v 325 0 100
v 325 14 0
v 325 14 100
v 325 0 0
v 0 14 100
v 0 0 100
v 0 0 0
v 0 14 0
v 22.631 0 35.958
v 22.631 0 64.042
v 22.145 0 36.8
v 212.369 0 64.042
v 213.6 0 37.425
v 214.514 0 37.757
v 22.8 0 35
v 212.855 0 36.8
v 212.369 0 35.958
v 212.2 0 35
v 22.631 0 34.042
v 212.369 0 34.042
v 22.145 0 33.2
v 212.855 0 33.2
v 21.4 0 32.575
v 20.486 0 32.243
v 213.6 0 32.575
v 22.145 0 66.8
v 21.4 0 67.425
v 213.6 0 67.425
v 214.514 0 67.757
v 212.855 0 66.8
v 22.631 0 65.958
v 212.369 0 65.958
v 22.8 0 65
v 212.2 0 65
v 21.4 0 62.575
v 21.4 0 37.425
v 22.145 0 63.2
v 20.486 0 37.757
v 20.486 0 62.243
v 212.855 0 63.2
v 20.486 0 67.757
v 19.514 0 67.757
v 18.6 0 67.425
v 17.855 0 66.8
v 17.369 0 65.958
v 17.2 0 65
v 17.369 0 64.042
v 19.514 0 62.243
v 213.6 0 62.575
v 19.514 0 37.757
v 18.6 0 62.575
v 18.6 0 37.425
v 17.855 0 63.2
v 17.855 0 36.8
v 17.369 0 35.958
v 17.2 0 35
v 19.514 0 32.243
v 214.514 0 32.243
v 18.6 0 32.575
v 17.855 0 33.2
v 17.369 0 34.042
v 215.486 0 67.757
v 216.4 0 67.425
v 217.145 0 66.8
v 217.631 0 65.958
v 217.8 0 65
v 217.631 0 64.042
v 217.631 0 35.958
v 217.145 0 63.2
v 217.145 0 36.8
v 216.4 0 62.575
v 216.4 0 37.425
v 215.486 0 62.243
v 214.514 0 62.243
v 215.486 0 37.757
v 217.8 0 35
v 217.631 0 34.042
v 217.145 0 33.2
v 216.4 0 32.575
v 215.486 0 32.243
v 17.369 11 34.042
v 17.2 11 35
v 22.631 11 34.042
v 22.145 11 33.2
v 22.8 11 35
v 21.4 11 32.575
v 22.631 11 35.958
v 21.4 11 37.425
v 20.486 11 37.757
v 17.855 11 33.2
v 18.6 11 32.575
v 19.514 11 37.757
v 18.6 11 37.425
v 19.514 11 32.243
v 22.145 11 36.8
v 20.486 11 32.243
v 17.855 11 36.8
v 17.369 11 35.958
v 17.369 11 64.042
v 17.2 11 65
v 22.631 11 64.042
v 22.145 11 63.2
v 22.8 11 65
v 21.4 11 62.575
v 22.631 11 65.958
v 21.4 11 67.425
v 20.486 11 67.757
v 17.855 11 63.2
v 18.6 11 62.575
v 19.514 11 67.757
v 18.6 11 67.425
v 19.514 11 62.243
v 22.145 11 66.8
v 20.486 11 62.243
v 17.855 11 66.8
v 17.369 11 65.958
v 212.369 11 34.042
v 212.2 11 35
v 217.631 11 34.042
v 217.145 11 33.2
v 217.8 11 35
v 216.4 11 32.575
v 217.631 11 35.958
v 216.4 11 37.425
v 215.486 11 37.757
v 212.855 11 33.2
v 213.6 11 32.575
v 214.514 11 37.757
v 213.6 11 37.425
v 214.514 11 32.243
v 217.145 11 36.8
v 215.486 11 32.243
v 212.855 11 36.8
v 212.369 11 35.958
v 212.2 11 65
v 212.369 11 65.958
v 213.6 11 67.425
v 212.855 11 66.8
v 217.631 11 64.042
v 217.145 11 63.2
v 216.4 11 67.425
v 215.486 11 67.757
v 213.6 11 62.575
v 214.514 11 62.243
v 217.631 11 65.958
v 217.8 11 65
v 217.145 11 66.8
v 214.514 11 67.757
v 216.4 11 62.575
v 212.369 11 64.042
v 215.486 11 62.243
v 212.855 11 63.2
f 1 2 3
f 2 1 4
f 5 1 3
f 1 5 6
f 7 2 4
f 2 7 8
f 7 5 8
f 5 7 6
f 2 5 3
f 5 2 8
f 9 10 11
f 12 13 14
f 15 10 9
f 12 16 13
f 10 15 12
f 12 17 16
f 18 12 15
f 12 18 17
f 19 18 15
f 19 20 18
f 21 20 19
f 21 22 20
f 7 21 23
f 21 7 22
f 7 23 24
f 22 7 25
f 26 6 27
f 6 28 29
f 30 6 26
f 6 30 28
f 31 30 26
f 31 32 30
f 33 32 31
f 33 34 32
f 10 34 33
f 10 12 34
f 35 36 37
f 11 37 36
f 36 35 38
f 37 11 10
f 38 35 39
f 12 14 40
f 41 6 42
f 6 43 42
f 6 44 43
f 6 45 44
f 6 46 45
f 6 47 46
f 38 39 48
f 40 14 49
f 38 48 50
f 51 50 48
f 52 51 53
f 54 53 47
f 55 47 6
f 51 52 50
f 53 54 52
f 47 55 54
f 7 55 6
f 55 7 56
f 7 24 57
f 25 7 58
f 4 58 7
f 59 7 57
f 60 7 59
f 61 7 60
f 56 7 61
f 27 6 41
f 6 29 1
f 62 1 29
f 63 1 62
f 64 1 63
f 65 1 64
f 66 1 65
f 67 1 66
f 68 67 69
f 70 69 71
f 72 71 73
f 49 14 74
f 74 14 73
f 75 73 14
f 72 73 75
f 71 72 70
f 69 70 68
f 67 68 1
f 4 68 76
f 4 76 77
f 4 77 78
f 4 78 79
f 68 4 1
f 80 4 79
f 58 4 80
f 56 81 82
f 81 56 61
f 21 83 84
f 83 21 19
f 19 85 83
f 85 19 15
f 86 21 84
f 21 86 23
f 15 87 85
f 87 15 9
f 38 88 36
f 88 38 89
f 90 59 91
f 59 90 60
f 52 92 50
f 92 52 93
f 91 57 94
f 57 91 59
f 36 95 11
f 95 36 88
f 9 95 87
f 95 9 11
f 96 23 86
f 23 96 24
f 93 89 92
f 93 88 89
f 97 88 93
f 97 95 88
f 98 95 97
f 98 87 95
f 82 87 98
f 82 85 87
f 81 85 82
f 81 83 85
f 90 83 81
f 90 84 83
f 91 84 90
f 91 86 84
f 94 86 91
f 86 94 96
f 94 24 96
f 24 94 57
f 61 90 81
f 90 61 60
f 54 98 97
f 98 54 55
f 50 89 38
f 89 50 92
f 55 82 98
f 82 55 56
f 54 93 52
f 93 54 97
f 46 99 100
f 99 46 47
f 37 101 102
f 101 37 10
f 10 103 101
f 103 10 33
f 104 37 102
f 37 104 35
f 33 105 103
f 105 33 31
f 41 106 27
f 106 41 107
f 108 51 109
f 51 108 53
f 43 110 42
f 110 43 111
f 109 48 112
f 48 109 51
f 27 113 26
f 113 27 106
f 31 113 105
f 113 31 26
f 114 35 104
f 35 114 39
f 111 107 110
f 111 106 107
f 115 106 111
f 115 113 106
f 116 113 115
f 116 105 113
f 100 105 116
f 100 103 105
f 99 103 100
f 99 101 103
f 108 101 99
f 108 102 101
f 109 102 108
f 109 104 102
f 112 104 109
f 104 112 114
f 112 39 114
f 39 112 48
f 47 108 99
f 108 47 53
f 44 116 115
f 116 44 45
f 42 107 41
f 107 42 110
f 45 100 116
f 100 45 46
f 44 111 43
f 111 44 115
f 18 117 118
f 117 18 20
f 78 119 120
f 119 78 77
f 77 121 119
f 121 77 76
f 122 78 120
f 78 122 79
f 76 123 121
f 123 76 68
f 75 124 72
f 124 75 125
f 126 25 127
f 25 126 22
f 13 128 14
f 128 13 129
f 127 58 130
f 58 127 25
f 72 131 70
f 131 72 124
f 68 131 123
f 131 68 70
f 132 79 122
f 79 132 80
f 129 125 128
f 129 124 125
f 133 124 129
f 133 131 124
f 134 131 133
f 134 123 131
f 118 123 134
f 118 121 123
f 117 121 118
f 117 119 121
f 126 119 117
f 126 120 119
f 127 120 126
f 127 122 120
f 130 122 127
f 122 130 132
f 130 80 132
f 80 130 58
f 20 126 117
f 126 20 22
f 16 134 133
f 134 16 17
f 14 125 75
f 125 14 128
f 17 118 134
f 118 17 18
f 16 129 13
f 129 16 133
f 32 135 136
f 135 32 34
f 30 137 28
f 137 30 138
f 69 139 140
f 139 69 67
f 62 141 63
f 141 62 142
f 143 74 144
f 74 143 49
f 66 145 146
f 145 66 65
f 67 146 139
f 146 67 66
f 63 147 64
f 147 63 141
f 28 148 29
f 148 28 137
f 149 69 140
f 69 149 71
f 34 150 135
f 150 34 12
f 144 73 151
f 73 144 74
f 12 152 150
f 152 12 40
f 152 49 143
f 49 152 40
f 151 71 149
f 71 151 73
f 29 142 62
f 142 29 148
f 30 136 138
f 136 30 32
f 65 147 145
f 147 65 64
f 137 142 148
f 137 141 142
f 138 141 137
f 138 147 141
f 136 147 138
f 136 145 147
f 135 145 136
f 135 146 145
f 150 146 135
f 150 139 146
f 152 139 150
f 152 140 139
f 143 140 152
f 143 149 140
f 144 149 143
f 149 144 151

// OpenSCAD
// file: ../lib/project/mount_ring_module.scad
// rodi-stand/mount_ring_module.scad
// Shared RO/DI mount ring modules.

module wedge() {
  wedge_radius = mount_ring_outer_diameter + 1;
  rotate([0, 0, -90 - mount_opening_angle / 2])
  translate([0, 0, -1])
    linear_extrude(height = mount_ring_height + 2) {
      polygon(points = [
        [0, 0],
        [wedge_radius, 0],
        [cos(mount_opening_angle) * wedge_radius, sin(mount_opening_angle) * wedge_radius]
      ]);
    }
}

module screw_cutout() {
  translate([0, 0, mount_ring_height / 2])
  rotate([-90, 0, 0])
  union() {
    cylinder(mount_ring_inner_diameter / 2 + mount_surface_extension + 1, screw_hole_diameter / 2, screw_hole_diameter / 2);
    cylinder(mount_ring_inner_diameter / 2 + mount_surface_extension - screw_wall_width, screw_access_diameter / 2, screw_access_diameter / 2);
  }
}

module mount_ring() {
  difference() {
    union() {
      translate([-mount_surface_width / 2, 0, 0])
        cube([mount_surface_width, mount_ring_inner_diameter / 2 + mount_surface_extension, mount_ring_height]);
      cylinder(mount_ring_height, mount_ring_outer_diameter / 2, mount_ring_outer_diameter / 2);
    };
    translate([0, 0, -1])
      cylinder(mount_ring_height + 2, mount_ring_inner_diameter / 2, mount_ring_inner_diameter / 2);
    wedge();
    translate([screw_spacing / 2, 0, 0])
      screw_cutout();
    translate([-screw_spacing / 2, 0, 0])
      screw_cutout();
  }
}
// main file
// RO/DI Water Filter Stand
// Designed for 3D printing on a 256x256x256 mm build plate

use <../lib/project/mount_ring_module.scad>;

// ---------- Public parameters (mm) ----------
// Base dimensions (full build plate).
base_width = 250;
base_depth = 250;
base_thickness = 15;
base_front_corner_cut = 25;
base_back_corner_cut = 50;

// Mounting surface dimensions (shared by stand and mount plates).
mount_width = 100; // Width of the mounting surface.
mount_height = 200; // Height of mounting surface (adjustable).
base_glueing_surface_thickness = 6; // Thickness of mounting surface on the base.

// Screw parameters (shared by mount ring and mount plates).
screw_spacing = 30; // Horizontal spacing between screw holes.

// Stand positioning.
stand_offset_from_back = 40; // Distance from back edge of base.
stand_position_x = base_width / 2; // Center of base width-wise.

// Honeycomb pattern parameters.
honeycomb_width = 34;
honeycomb_margin = 40; // Margin from front and side edges of base.
honeycomb_back_margin = 80; // Distance from back edge - keeps back solid for stand mounting.

// Reinforcement gusset dimensions (optional - set to 0 to disable).
gusset_depth = 40; // Forward extension from mounting surface.
gusset_thickness = 6; // Thickness of gussets.
top_surface_angle = 45; // Angle of the top surface in degrees (0 = flat, positive = angled back).

// Mount ring parameters.
mount_ring_outer_diameter = 68;
mount_ring_inner_diameter = 60.5;
mount_ring_height = 20;
mount_surface_width = 65;
mount_surface_extension = 20;
mount_opening_angle = 120;
screw_wall_width = 12;
screw_hole_diameter = 4.5; // Mount ring screw hole diameter.
screw_access_diameter = 10;

// ---------- Resolution ----------
$fa = 1;
$fs = 1;

// ---------- Derived ----------
honeycomb_radius = (honeycomb_width / 2) / cos(30); // Radius of each hexagon (circumradius - distance from center to vertex).

// Calculate stand position.
stand_x = stand_position_x;
stand_y = base_depth - stand_offset_from_back - base_glueing_surface_thickness / 2;

module hexagon(radius) {
    // Create a regular hexagon
    // radius is the distance from center to vertex
    rotate([0, 0, 30])
    linear_extrude(height = base_thickness + 1) {
        circle(radius, $fn = 6);
    }
}

module honeycomb_pattern() {
    // Generate a tight honeycomb pattern where hexagons touch (like infill)
    // Hexagons are offset in alternating rows for true honeycomb pattern
    // For touching hexagons: horizontal spacing = radius * sqrt(3), vertical = radius * 1.5
    hex_apothem = honeycomb_radius * sqrt(3) / 2; // Distance from center to edge
    hex_horizontal_spacing = honeycomb_radius * sqrt(3); // Center-to-center horizontal (same row)
    hex_vertical_spacing = honeycomb_radius * 1.5; // Center-to-center vertical (adjacent rows)
    hex_row_offset = honeycomb_radius * sqrt(3) / 2; // Horizontal offset for alternating rows
    
    // Calculate pattern area (only front portion, not near back where stand mounts)
    pattern_width = base_width - 2 * honeycomb_margin;
    pattern_depth = base_depth - honeycomb_margin - honeycomb_back_margin; // Only front portion
    
    // Calculate how many hexagons fit
    num_cols = floor(pattern_width / hex_horizontal_spacing) + 2; // Extra columns for offset rows
    num_rows = floor(pattern_depth / hex_vertical_spacing) + 1;
    
    // Start position (front and centered)
    start_x = honeycomb_margin;
    start_y = honeycomb_margin;
    
    // Generate hexagons in honeycomb pattern (only in front area)
    for (row = [0 : num_rows - 1]) {
        y_pos = start_y + row * hex_vertical_spacing;
        // Only generate rows that are in the front area
        if (y_pos <= base_depth - honeycomb_back_margin) {
            // Offset every other row for honeycomb pattern
            x_offset = (row % 2 == 0) ? 0 : hex_row_offset;
            for (col = [0 : num_cols - 1]) {
                x_pos = start_x + col * hex_horizontal_spacing + x_offset;
                // Only create hexagon if it's within the horizontal bounds
                if (x_pos >= honeycomb_margin && x_pos <= base_width - honeycomb_margin) {
                    translate([x_pos, y_pos, -0.5])
                        hexagon(honeycomb_radius * 0.8);
                }
            }
        }
    }
}

module base() {
    // Base as a full square with honeycomb pattern cut from the middle
    difference() {
        // Full square base as extruded polygon (ready for rounded corners later)
        linear_extrude(height = base_thickness) {
            polygon(points = [
                [0, base_front_corner_cut], // Front left corner
                [base_front_corner_cut, 0],  // Front left corner
                [base_width - base_front_corner_cut, 0],              // Front right corner
                [base_width, base_front_corner_cut],              // Front right corner
                [base_width, base_depth - base_back_corner_cut],     // Back right corner
                [base_width - base_back_corner_cut, base_depth],     // Back right corner
                [base_back_corner_cut, base_depth],              // Back left corner
                [0, base_depth - base_back_corner_cut]              // Back left corner
            ]);
        }
        
        // Cut honeycomb pattern from the middle
        honeycomb_pattern();
    }
}

module angled_top_cut() {
    // Cut angled top surface using a rotated cube
    // Create cube, rotate around X axis, then translate along Z axis
    translate([0, -base_glueing_surface_thickness / 2, mount_height])
        rotate([-top_surface_angle, 0, 0])
            translate([-mount_width, -gusset_depth, 0])
                cube([mount_width * 2, gusset_depth * 3, gusset_depth * 3]);
}

module mounting_stand() {
    // Create the gluing surface and gussets as cubes at origin
    // Geometry is created with back edge at Y=0, centered at X=0, starting at Z=0
    difference() {
        union() {
            // Mounting surface (flat wall-like surface on base - mount plate glues to this)
            // Positioned so back edge is at Y=0, centered at X=0
            translate([-mount_width / 2, -base_glueing_surface_thickness / 2, 0])
                cube([mount_width, base_glueing_surface_thickness, mount_height]);
            
            // Reinforcement gussets on both sides of the mounting surface
            // Gussets are simple cubes extending forward from the mounting surface
            if (gusset_thickness > 0) {
                // Left gusset - extends forward from left edge of mounting surface
                translate([-mount_width / 2, -base_glueing_surface_thickness / 2, 0])
                    cube([gusset_thickness, gusset_depth + base_glueing_surface_thickness, mount_height]);
                
                // Right gusset - extends forward from right edge of mounting surface
                translate([mount_width / 2 - gusset_thickness, -base_glueing_surface_thickness / 2, 0])
                    cube([gusset_thickness, gusset_depth + base_glueing_surface_thickness, mount_height]);
            }
        }
        
        // Cut angled top surface
        angled_top_cut();
    }
}

module stand() {
    base();
    // Translate mounting stand to correct position
    translate([stand_x, stand_y, base_thickness])
        mounting_stand();
}

// ============================================================================
// Mount Ring - for mounting RO/DI unit
// ============================================================================


// ============================================================================
// Mount Plates - extend mounting surface height beyond build plate limits
// ============================================================================

// Mount plate parameters
plate_insert_diameter = 5.6; // Mount plate screw hole diameter (different from mount ring)
plate_insert_depth = 11;
plate_insert_back_wall_thickness = 3;
mount_thickness = plate_insert_depth + plate_insert_back_wall_thickness; // Thickness of the mount plate (separate part that glues to base)
plate_screw_hole_vertical_spacing = 195;
plate_screw_bottom_hole_spacing = 110;
plate_screw_hole_top_spacing = 20;

module plate_screw_hole(hole_diameter) {
    translate([0, -plate_insert_back_wall_thickness, 0])
    rotate([-90, 0, 0])
    cylinder(mount_thickness, hole_diameter / 2, hole_diameter / 2);
}

module mount_plate() {
    // Mount plate module
    // When printed on its side, this will have:
    // - Height (Z): mount_thickness (10mm) - layers will be vertical in final assembly
    // - Width (Y): mount_width (100mm) - matches stand mounting surface
    // - Length (X): length parameter
    // 
    // For printing: rotate 90° around X axis to lay on its side, then 45° around Z for diagonal
    difference() {
        cube([plate_screw_hole_top_spacing + plate_screw_bottom_hole_spacing + plate_screw_hole_vertical_spacing, mount_thickness, mount_width]);
        translate([plate_screw_hole_top_spacing, 0, mount_width / 2 - screw_spacing / 2])
            plate_screw_hole(plate_insert_diameter);
        translate([plate_screw_hole_top_spacing, 0, mount_width / 2 + screw_spacing / 2])
            plate_screw_hole(plate_insert_diameter);
        translate([plate_screw_hole_top_spacing + plate_screw_hole_vertical_spacing, 0, mount_width / 2 - screw_spacing / 2])
            plate_screw_hole(plate_insert_diameter);
        translate([plate_screw_hole_top_spacing + plate_screw_hole_vertical_spacing, 0, mount_width / 2 + screw_spacing / 2])
            plate_screw_hole(plate_insert_diameter);
    }
}

module test_mount_plate() {
    // Mount plate module
    // When printed on its side, this will have:
    // - Height (Z): mount_thickness (10mm) - layers will be vertical in final assembly
    // - Width (Y): mount_width (100mm) - matches stand mounting surface
    // - Length (X): length parameter
    // 
    // For printing: rotate 90° around X axis to lay on its side, then 45° around Z for diagonal
    difference() {
        cube([plate_screw_hole_top_spacing * 2, mount_thickness, mount_width]);
        translate([plate_screw_hole_top_spacing, 0, mount_width / 2 - screw_spacing / 2])
            plate_screw_hole(plate_insert_diameter);
        translate([plate_screw_hole_top_spacing, 0, mount_width / 2 + screw_spacing / 2])
            plate_screw_hole(plate_insert_diameter);
    }
}

// ============================================================================
// Main render - uncomment what you want to print
// ============================================================================

//stand();
//mount_ring();
mount_plate();
//test_mount_plate();
//mounting_stand();
//angled_top_cut();
